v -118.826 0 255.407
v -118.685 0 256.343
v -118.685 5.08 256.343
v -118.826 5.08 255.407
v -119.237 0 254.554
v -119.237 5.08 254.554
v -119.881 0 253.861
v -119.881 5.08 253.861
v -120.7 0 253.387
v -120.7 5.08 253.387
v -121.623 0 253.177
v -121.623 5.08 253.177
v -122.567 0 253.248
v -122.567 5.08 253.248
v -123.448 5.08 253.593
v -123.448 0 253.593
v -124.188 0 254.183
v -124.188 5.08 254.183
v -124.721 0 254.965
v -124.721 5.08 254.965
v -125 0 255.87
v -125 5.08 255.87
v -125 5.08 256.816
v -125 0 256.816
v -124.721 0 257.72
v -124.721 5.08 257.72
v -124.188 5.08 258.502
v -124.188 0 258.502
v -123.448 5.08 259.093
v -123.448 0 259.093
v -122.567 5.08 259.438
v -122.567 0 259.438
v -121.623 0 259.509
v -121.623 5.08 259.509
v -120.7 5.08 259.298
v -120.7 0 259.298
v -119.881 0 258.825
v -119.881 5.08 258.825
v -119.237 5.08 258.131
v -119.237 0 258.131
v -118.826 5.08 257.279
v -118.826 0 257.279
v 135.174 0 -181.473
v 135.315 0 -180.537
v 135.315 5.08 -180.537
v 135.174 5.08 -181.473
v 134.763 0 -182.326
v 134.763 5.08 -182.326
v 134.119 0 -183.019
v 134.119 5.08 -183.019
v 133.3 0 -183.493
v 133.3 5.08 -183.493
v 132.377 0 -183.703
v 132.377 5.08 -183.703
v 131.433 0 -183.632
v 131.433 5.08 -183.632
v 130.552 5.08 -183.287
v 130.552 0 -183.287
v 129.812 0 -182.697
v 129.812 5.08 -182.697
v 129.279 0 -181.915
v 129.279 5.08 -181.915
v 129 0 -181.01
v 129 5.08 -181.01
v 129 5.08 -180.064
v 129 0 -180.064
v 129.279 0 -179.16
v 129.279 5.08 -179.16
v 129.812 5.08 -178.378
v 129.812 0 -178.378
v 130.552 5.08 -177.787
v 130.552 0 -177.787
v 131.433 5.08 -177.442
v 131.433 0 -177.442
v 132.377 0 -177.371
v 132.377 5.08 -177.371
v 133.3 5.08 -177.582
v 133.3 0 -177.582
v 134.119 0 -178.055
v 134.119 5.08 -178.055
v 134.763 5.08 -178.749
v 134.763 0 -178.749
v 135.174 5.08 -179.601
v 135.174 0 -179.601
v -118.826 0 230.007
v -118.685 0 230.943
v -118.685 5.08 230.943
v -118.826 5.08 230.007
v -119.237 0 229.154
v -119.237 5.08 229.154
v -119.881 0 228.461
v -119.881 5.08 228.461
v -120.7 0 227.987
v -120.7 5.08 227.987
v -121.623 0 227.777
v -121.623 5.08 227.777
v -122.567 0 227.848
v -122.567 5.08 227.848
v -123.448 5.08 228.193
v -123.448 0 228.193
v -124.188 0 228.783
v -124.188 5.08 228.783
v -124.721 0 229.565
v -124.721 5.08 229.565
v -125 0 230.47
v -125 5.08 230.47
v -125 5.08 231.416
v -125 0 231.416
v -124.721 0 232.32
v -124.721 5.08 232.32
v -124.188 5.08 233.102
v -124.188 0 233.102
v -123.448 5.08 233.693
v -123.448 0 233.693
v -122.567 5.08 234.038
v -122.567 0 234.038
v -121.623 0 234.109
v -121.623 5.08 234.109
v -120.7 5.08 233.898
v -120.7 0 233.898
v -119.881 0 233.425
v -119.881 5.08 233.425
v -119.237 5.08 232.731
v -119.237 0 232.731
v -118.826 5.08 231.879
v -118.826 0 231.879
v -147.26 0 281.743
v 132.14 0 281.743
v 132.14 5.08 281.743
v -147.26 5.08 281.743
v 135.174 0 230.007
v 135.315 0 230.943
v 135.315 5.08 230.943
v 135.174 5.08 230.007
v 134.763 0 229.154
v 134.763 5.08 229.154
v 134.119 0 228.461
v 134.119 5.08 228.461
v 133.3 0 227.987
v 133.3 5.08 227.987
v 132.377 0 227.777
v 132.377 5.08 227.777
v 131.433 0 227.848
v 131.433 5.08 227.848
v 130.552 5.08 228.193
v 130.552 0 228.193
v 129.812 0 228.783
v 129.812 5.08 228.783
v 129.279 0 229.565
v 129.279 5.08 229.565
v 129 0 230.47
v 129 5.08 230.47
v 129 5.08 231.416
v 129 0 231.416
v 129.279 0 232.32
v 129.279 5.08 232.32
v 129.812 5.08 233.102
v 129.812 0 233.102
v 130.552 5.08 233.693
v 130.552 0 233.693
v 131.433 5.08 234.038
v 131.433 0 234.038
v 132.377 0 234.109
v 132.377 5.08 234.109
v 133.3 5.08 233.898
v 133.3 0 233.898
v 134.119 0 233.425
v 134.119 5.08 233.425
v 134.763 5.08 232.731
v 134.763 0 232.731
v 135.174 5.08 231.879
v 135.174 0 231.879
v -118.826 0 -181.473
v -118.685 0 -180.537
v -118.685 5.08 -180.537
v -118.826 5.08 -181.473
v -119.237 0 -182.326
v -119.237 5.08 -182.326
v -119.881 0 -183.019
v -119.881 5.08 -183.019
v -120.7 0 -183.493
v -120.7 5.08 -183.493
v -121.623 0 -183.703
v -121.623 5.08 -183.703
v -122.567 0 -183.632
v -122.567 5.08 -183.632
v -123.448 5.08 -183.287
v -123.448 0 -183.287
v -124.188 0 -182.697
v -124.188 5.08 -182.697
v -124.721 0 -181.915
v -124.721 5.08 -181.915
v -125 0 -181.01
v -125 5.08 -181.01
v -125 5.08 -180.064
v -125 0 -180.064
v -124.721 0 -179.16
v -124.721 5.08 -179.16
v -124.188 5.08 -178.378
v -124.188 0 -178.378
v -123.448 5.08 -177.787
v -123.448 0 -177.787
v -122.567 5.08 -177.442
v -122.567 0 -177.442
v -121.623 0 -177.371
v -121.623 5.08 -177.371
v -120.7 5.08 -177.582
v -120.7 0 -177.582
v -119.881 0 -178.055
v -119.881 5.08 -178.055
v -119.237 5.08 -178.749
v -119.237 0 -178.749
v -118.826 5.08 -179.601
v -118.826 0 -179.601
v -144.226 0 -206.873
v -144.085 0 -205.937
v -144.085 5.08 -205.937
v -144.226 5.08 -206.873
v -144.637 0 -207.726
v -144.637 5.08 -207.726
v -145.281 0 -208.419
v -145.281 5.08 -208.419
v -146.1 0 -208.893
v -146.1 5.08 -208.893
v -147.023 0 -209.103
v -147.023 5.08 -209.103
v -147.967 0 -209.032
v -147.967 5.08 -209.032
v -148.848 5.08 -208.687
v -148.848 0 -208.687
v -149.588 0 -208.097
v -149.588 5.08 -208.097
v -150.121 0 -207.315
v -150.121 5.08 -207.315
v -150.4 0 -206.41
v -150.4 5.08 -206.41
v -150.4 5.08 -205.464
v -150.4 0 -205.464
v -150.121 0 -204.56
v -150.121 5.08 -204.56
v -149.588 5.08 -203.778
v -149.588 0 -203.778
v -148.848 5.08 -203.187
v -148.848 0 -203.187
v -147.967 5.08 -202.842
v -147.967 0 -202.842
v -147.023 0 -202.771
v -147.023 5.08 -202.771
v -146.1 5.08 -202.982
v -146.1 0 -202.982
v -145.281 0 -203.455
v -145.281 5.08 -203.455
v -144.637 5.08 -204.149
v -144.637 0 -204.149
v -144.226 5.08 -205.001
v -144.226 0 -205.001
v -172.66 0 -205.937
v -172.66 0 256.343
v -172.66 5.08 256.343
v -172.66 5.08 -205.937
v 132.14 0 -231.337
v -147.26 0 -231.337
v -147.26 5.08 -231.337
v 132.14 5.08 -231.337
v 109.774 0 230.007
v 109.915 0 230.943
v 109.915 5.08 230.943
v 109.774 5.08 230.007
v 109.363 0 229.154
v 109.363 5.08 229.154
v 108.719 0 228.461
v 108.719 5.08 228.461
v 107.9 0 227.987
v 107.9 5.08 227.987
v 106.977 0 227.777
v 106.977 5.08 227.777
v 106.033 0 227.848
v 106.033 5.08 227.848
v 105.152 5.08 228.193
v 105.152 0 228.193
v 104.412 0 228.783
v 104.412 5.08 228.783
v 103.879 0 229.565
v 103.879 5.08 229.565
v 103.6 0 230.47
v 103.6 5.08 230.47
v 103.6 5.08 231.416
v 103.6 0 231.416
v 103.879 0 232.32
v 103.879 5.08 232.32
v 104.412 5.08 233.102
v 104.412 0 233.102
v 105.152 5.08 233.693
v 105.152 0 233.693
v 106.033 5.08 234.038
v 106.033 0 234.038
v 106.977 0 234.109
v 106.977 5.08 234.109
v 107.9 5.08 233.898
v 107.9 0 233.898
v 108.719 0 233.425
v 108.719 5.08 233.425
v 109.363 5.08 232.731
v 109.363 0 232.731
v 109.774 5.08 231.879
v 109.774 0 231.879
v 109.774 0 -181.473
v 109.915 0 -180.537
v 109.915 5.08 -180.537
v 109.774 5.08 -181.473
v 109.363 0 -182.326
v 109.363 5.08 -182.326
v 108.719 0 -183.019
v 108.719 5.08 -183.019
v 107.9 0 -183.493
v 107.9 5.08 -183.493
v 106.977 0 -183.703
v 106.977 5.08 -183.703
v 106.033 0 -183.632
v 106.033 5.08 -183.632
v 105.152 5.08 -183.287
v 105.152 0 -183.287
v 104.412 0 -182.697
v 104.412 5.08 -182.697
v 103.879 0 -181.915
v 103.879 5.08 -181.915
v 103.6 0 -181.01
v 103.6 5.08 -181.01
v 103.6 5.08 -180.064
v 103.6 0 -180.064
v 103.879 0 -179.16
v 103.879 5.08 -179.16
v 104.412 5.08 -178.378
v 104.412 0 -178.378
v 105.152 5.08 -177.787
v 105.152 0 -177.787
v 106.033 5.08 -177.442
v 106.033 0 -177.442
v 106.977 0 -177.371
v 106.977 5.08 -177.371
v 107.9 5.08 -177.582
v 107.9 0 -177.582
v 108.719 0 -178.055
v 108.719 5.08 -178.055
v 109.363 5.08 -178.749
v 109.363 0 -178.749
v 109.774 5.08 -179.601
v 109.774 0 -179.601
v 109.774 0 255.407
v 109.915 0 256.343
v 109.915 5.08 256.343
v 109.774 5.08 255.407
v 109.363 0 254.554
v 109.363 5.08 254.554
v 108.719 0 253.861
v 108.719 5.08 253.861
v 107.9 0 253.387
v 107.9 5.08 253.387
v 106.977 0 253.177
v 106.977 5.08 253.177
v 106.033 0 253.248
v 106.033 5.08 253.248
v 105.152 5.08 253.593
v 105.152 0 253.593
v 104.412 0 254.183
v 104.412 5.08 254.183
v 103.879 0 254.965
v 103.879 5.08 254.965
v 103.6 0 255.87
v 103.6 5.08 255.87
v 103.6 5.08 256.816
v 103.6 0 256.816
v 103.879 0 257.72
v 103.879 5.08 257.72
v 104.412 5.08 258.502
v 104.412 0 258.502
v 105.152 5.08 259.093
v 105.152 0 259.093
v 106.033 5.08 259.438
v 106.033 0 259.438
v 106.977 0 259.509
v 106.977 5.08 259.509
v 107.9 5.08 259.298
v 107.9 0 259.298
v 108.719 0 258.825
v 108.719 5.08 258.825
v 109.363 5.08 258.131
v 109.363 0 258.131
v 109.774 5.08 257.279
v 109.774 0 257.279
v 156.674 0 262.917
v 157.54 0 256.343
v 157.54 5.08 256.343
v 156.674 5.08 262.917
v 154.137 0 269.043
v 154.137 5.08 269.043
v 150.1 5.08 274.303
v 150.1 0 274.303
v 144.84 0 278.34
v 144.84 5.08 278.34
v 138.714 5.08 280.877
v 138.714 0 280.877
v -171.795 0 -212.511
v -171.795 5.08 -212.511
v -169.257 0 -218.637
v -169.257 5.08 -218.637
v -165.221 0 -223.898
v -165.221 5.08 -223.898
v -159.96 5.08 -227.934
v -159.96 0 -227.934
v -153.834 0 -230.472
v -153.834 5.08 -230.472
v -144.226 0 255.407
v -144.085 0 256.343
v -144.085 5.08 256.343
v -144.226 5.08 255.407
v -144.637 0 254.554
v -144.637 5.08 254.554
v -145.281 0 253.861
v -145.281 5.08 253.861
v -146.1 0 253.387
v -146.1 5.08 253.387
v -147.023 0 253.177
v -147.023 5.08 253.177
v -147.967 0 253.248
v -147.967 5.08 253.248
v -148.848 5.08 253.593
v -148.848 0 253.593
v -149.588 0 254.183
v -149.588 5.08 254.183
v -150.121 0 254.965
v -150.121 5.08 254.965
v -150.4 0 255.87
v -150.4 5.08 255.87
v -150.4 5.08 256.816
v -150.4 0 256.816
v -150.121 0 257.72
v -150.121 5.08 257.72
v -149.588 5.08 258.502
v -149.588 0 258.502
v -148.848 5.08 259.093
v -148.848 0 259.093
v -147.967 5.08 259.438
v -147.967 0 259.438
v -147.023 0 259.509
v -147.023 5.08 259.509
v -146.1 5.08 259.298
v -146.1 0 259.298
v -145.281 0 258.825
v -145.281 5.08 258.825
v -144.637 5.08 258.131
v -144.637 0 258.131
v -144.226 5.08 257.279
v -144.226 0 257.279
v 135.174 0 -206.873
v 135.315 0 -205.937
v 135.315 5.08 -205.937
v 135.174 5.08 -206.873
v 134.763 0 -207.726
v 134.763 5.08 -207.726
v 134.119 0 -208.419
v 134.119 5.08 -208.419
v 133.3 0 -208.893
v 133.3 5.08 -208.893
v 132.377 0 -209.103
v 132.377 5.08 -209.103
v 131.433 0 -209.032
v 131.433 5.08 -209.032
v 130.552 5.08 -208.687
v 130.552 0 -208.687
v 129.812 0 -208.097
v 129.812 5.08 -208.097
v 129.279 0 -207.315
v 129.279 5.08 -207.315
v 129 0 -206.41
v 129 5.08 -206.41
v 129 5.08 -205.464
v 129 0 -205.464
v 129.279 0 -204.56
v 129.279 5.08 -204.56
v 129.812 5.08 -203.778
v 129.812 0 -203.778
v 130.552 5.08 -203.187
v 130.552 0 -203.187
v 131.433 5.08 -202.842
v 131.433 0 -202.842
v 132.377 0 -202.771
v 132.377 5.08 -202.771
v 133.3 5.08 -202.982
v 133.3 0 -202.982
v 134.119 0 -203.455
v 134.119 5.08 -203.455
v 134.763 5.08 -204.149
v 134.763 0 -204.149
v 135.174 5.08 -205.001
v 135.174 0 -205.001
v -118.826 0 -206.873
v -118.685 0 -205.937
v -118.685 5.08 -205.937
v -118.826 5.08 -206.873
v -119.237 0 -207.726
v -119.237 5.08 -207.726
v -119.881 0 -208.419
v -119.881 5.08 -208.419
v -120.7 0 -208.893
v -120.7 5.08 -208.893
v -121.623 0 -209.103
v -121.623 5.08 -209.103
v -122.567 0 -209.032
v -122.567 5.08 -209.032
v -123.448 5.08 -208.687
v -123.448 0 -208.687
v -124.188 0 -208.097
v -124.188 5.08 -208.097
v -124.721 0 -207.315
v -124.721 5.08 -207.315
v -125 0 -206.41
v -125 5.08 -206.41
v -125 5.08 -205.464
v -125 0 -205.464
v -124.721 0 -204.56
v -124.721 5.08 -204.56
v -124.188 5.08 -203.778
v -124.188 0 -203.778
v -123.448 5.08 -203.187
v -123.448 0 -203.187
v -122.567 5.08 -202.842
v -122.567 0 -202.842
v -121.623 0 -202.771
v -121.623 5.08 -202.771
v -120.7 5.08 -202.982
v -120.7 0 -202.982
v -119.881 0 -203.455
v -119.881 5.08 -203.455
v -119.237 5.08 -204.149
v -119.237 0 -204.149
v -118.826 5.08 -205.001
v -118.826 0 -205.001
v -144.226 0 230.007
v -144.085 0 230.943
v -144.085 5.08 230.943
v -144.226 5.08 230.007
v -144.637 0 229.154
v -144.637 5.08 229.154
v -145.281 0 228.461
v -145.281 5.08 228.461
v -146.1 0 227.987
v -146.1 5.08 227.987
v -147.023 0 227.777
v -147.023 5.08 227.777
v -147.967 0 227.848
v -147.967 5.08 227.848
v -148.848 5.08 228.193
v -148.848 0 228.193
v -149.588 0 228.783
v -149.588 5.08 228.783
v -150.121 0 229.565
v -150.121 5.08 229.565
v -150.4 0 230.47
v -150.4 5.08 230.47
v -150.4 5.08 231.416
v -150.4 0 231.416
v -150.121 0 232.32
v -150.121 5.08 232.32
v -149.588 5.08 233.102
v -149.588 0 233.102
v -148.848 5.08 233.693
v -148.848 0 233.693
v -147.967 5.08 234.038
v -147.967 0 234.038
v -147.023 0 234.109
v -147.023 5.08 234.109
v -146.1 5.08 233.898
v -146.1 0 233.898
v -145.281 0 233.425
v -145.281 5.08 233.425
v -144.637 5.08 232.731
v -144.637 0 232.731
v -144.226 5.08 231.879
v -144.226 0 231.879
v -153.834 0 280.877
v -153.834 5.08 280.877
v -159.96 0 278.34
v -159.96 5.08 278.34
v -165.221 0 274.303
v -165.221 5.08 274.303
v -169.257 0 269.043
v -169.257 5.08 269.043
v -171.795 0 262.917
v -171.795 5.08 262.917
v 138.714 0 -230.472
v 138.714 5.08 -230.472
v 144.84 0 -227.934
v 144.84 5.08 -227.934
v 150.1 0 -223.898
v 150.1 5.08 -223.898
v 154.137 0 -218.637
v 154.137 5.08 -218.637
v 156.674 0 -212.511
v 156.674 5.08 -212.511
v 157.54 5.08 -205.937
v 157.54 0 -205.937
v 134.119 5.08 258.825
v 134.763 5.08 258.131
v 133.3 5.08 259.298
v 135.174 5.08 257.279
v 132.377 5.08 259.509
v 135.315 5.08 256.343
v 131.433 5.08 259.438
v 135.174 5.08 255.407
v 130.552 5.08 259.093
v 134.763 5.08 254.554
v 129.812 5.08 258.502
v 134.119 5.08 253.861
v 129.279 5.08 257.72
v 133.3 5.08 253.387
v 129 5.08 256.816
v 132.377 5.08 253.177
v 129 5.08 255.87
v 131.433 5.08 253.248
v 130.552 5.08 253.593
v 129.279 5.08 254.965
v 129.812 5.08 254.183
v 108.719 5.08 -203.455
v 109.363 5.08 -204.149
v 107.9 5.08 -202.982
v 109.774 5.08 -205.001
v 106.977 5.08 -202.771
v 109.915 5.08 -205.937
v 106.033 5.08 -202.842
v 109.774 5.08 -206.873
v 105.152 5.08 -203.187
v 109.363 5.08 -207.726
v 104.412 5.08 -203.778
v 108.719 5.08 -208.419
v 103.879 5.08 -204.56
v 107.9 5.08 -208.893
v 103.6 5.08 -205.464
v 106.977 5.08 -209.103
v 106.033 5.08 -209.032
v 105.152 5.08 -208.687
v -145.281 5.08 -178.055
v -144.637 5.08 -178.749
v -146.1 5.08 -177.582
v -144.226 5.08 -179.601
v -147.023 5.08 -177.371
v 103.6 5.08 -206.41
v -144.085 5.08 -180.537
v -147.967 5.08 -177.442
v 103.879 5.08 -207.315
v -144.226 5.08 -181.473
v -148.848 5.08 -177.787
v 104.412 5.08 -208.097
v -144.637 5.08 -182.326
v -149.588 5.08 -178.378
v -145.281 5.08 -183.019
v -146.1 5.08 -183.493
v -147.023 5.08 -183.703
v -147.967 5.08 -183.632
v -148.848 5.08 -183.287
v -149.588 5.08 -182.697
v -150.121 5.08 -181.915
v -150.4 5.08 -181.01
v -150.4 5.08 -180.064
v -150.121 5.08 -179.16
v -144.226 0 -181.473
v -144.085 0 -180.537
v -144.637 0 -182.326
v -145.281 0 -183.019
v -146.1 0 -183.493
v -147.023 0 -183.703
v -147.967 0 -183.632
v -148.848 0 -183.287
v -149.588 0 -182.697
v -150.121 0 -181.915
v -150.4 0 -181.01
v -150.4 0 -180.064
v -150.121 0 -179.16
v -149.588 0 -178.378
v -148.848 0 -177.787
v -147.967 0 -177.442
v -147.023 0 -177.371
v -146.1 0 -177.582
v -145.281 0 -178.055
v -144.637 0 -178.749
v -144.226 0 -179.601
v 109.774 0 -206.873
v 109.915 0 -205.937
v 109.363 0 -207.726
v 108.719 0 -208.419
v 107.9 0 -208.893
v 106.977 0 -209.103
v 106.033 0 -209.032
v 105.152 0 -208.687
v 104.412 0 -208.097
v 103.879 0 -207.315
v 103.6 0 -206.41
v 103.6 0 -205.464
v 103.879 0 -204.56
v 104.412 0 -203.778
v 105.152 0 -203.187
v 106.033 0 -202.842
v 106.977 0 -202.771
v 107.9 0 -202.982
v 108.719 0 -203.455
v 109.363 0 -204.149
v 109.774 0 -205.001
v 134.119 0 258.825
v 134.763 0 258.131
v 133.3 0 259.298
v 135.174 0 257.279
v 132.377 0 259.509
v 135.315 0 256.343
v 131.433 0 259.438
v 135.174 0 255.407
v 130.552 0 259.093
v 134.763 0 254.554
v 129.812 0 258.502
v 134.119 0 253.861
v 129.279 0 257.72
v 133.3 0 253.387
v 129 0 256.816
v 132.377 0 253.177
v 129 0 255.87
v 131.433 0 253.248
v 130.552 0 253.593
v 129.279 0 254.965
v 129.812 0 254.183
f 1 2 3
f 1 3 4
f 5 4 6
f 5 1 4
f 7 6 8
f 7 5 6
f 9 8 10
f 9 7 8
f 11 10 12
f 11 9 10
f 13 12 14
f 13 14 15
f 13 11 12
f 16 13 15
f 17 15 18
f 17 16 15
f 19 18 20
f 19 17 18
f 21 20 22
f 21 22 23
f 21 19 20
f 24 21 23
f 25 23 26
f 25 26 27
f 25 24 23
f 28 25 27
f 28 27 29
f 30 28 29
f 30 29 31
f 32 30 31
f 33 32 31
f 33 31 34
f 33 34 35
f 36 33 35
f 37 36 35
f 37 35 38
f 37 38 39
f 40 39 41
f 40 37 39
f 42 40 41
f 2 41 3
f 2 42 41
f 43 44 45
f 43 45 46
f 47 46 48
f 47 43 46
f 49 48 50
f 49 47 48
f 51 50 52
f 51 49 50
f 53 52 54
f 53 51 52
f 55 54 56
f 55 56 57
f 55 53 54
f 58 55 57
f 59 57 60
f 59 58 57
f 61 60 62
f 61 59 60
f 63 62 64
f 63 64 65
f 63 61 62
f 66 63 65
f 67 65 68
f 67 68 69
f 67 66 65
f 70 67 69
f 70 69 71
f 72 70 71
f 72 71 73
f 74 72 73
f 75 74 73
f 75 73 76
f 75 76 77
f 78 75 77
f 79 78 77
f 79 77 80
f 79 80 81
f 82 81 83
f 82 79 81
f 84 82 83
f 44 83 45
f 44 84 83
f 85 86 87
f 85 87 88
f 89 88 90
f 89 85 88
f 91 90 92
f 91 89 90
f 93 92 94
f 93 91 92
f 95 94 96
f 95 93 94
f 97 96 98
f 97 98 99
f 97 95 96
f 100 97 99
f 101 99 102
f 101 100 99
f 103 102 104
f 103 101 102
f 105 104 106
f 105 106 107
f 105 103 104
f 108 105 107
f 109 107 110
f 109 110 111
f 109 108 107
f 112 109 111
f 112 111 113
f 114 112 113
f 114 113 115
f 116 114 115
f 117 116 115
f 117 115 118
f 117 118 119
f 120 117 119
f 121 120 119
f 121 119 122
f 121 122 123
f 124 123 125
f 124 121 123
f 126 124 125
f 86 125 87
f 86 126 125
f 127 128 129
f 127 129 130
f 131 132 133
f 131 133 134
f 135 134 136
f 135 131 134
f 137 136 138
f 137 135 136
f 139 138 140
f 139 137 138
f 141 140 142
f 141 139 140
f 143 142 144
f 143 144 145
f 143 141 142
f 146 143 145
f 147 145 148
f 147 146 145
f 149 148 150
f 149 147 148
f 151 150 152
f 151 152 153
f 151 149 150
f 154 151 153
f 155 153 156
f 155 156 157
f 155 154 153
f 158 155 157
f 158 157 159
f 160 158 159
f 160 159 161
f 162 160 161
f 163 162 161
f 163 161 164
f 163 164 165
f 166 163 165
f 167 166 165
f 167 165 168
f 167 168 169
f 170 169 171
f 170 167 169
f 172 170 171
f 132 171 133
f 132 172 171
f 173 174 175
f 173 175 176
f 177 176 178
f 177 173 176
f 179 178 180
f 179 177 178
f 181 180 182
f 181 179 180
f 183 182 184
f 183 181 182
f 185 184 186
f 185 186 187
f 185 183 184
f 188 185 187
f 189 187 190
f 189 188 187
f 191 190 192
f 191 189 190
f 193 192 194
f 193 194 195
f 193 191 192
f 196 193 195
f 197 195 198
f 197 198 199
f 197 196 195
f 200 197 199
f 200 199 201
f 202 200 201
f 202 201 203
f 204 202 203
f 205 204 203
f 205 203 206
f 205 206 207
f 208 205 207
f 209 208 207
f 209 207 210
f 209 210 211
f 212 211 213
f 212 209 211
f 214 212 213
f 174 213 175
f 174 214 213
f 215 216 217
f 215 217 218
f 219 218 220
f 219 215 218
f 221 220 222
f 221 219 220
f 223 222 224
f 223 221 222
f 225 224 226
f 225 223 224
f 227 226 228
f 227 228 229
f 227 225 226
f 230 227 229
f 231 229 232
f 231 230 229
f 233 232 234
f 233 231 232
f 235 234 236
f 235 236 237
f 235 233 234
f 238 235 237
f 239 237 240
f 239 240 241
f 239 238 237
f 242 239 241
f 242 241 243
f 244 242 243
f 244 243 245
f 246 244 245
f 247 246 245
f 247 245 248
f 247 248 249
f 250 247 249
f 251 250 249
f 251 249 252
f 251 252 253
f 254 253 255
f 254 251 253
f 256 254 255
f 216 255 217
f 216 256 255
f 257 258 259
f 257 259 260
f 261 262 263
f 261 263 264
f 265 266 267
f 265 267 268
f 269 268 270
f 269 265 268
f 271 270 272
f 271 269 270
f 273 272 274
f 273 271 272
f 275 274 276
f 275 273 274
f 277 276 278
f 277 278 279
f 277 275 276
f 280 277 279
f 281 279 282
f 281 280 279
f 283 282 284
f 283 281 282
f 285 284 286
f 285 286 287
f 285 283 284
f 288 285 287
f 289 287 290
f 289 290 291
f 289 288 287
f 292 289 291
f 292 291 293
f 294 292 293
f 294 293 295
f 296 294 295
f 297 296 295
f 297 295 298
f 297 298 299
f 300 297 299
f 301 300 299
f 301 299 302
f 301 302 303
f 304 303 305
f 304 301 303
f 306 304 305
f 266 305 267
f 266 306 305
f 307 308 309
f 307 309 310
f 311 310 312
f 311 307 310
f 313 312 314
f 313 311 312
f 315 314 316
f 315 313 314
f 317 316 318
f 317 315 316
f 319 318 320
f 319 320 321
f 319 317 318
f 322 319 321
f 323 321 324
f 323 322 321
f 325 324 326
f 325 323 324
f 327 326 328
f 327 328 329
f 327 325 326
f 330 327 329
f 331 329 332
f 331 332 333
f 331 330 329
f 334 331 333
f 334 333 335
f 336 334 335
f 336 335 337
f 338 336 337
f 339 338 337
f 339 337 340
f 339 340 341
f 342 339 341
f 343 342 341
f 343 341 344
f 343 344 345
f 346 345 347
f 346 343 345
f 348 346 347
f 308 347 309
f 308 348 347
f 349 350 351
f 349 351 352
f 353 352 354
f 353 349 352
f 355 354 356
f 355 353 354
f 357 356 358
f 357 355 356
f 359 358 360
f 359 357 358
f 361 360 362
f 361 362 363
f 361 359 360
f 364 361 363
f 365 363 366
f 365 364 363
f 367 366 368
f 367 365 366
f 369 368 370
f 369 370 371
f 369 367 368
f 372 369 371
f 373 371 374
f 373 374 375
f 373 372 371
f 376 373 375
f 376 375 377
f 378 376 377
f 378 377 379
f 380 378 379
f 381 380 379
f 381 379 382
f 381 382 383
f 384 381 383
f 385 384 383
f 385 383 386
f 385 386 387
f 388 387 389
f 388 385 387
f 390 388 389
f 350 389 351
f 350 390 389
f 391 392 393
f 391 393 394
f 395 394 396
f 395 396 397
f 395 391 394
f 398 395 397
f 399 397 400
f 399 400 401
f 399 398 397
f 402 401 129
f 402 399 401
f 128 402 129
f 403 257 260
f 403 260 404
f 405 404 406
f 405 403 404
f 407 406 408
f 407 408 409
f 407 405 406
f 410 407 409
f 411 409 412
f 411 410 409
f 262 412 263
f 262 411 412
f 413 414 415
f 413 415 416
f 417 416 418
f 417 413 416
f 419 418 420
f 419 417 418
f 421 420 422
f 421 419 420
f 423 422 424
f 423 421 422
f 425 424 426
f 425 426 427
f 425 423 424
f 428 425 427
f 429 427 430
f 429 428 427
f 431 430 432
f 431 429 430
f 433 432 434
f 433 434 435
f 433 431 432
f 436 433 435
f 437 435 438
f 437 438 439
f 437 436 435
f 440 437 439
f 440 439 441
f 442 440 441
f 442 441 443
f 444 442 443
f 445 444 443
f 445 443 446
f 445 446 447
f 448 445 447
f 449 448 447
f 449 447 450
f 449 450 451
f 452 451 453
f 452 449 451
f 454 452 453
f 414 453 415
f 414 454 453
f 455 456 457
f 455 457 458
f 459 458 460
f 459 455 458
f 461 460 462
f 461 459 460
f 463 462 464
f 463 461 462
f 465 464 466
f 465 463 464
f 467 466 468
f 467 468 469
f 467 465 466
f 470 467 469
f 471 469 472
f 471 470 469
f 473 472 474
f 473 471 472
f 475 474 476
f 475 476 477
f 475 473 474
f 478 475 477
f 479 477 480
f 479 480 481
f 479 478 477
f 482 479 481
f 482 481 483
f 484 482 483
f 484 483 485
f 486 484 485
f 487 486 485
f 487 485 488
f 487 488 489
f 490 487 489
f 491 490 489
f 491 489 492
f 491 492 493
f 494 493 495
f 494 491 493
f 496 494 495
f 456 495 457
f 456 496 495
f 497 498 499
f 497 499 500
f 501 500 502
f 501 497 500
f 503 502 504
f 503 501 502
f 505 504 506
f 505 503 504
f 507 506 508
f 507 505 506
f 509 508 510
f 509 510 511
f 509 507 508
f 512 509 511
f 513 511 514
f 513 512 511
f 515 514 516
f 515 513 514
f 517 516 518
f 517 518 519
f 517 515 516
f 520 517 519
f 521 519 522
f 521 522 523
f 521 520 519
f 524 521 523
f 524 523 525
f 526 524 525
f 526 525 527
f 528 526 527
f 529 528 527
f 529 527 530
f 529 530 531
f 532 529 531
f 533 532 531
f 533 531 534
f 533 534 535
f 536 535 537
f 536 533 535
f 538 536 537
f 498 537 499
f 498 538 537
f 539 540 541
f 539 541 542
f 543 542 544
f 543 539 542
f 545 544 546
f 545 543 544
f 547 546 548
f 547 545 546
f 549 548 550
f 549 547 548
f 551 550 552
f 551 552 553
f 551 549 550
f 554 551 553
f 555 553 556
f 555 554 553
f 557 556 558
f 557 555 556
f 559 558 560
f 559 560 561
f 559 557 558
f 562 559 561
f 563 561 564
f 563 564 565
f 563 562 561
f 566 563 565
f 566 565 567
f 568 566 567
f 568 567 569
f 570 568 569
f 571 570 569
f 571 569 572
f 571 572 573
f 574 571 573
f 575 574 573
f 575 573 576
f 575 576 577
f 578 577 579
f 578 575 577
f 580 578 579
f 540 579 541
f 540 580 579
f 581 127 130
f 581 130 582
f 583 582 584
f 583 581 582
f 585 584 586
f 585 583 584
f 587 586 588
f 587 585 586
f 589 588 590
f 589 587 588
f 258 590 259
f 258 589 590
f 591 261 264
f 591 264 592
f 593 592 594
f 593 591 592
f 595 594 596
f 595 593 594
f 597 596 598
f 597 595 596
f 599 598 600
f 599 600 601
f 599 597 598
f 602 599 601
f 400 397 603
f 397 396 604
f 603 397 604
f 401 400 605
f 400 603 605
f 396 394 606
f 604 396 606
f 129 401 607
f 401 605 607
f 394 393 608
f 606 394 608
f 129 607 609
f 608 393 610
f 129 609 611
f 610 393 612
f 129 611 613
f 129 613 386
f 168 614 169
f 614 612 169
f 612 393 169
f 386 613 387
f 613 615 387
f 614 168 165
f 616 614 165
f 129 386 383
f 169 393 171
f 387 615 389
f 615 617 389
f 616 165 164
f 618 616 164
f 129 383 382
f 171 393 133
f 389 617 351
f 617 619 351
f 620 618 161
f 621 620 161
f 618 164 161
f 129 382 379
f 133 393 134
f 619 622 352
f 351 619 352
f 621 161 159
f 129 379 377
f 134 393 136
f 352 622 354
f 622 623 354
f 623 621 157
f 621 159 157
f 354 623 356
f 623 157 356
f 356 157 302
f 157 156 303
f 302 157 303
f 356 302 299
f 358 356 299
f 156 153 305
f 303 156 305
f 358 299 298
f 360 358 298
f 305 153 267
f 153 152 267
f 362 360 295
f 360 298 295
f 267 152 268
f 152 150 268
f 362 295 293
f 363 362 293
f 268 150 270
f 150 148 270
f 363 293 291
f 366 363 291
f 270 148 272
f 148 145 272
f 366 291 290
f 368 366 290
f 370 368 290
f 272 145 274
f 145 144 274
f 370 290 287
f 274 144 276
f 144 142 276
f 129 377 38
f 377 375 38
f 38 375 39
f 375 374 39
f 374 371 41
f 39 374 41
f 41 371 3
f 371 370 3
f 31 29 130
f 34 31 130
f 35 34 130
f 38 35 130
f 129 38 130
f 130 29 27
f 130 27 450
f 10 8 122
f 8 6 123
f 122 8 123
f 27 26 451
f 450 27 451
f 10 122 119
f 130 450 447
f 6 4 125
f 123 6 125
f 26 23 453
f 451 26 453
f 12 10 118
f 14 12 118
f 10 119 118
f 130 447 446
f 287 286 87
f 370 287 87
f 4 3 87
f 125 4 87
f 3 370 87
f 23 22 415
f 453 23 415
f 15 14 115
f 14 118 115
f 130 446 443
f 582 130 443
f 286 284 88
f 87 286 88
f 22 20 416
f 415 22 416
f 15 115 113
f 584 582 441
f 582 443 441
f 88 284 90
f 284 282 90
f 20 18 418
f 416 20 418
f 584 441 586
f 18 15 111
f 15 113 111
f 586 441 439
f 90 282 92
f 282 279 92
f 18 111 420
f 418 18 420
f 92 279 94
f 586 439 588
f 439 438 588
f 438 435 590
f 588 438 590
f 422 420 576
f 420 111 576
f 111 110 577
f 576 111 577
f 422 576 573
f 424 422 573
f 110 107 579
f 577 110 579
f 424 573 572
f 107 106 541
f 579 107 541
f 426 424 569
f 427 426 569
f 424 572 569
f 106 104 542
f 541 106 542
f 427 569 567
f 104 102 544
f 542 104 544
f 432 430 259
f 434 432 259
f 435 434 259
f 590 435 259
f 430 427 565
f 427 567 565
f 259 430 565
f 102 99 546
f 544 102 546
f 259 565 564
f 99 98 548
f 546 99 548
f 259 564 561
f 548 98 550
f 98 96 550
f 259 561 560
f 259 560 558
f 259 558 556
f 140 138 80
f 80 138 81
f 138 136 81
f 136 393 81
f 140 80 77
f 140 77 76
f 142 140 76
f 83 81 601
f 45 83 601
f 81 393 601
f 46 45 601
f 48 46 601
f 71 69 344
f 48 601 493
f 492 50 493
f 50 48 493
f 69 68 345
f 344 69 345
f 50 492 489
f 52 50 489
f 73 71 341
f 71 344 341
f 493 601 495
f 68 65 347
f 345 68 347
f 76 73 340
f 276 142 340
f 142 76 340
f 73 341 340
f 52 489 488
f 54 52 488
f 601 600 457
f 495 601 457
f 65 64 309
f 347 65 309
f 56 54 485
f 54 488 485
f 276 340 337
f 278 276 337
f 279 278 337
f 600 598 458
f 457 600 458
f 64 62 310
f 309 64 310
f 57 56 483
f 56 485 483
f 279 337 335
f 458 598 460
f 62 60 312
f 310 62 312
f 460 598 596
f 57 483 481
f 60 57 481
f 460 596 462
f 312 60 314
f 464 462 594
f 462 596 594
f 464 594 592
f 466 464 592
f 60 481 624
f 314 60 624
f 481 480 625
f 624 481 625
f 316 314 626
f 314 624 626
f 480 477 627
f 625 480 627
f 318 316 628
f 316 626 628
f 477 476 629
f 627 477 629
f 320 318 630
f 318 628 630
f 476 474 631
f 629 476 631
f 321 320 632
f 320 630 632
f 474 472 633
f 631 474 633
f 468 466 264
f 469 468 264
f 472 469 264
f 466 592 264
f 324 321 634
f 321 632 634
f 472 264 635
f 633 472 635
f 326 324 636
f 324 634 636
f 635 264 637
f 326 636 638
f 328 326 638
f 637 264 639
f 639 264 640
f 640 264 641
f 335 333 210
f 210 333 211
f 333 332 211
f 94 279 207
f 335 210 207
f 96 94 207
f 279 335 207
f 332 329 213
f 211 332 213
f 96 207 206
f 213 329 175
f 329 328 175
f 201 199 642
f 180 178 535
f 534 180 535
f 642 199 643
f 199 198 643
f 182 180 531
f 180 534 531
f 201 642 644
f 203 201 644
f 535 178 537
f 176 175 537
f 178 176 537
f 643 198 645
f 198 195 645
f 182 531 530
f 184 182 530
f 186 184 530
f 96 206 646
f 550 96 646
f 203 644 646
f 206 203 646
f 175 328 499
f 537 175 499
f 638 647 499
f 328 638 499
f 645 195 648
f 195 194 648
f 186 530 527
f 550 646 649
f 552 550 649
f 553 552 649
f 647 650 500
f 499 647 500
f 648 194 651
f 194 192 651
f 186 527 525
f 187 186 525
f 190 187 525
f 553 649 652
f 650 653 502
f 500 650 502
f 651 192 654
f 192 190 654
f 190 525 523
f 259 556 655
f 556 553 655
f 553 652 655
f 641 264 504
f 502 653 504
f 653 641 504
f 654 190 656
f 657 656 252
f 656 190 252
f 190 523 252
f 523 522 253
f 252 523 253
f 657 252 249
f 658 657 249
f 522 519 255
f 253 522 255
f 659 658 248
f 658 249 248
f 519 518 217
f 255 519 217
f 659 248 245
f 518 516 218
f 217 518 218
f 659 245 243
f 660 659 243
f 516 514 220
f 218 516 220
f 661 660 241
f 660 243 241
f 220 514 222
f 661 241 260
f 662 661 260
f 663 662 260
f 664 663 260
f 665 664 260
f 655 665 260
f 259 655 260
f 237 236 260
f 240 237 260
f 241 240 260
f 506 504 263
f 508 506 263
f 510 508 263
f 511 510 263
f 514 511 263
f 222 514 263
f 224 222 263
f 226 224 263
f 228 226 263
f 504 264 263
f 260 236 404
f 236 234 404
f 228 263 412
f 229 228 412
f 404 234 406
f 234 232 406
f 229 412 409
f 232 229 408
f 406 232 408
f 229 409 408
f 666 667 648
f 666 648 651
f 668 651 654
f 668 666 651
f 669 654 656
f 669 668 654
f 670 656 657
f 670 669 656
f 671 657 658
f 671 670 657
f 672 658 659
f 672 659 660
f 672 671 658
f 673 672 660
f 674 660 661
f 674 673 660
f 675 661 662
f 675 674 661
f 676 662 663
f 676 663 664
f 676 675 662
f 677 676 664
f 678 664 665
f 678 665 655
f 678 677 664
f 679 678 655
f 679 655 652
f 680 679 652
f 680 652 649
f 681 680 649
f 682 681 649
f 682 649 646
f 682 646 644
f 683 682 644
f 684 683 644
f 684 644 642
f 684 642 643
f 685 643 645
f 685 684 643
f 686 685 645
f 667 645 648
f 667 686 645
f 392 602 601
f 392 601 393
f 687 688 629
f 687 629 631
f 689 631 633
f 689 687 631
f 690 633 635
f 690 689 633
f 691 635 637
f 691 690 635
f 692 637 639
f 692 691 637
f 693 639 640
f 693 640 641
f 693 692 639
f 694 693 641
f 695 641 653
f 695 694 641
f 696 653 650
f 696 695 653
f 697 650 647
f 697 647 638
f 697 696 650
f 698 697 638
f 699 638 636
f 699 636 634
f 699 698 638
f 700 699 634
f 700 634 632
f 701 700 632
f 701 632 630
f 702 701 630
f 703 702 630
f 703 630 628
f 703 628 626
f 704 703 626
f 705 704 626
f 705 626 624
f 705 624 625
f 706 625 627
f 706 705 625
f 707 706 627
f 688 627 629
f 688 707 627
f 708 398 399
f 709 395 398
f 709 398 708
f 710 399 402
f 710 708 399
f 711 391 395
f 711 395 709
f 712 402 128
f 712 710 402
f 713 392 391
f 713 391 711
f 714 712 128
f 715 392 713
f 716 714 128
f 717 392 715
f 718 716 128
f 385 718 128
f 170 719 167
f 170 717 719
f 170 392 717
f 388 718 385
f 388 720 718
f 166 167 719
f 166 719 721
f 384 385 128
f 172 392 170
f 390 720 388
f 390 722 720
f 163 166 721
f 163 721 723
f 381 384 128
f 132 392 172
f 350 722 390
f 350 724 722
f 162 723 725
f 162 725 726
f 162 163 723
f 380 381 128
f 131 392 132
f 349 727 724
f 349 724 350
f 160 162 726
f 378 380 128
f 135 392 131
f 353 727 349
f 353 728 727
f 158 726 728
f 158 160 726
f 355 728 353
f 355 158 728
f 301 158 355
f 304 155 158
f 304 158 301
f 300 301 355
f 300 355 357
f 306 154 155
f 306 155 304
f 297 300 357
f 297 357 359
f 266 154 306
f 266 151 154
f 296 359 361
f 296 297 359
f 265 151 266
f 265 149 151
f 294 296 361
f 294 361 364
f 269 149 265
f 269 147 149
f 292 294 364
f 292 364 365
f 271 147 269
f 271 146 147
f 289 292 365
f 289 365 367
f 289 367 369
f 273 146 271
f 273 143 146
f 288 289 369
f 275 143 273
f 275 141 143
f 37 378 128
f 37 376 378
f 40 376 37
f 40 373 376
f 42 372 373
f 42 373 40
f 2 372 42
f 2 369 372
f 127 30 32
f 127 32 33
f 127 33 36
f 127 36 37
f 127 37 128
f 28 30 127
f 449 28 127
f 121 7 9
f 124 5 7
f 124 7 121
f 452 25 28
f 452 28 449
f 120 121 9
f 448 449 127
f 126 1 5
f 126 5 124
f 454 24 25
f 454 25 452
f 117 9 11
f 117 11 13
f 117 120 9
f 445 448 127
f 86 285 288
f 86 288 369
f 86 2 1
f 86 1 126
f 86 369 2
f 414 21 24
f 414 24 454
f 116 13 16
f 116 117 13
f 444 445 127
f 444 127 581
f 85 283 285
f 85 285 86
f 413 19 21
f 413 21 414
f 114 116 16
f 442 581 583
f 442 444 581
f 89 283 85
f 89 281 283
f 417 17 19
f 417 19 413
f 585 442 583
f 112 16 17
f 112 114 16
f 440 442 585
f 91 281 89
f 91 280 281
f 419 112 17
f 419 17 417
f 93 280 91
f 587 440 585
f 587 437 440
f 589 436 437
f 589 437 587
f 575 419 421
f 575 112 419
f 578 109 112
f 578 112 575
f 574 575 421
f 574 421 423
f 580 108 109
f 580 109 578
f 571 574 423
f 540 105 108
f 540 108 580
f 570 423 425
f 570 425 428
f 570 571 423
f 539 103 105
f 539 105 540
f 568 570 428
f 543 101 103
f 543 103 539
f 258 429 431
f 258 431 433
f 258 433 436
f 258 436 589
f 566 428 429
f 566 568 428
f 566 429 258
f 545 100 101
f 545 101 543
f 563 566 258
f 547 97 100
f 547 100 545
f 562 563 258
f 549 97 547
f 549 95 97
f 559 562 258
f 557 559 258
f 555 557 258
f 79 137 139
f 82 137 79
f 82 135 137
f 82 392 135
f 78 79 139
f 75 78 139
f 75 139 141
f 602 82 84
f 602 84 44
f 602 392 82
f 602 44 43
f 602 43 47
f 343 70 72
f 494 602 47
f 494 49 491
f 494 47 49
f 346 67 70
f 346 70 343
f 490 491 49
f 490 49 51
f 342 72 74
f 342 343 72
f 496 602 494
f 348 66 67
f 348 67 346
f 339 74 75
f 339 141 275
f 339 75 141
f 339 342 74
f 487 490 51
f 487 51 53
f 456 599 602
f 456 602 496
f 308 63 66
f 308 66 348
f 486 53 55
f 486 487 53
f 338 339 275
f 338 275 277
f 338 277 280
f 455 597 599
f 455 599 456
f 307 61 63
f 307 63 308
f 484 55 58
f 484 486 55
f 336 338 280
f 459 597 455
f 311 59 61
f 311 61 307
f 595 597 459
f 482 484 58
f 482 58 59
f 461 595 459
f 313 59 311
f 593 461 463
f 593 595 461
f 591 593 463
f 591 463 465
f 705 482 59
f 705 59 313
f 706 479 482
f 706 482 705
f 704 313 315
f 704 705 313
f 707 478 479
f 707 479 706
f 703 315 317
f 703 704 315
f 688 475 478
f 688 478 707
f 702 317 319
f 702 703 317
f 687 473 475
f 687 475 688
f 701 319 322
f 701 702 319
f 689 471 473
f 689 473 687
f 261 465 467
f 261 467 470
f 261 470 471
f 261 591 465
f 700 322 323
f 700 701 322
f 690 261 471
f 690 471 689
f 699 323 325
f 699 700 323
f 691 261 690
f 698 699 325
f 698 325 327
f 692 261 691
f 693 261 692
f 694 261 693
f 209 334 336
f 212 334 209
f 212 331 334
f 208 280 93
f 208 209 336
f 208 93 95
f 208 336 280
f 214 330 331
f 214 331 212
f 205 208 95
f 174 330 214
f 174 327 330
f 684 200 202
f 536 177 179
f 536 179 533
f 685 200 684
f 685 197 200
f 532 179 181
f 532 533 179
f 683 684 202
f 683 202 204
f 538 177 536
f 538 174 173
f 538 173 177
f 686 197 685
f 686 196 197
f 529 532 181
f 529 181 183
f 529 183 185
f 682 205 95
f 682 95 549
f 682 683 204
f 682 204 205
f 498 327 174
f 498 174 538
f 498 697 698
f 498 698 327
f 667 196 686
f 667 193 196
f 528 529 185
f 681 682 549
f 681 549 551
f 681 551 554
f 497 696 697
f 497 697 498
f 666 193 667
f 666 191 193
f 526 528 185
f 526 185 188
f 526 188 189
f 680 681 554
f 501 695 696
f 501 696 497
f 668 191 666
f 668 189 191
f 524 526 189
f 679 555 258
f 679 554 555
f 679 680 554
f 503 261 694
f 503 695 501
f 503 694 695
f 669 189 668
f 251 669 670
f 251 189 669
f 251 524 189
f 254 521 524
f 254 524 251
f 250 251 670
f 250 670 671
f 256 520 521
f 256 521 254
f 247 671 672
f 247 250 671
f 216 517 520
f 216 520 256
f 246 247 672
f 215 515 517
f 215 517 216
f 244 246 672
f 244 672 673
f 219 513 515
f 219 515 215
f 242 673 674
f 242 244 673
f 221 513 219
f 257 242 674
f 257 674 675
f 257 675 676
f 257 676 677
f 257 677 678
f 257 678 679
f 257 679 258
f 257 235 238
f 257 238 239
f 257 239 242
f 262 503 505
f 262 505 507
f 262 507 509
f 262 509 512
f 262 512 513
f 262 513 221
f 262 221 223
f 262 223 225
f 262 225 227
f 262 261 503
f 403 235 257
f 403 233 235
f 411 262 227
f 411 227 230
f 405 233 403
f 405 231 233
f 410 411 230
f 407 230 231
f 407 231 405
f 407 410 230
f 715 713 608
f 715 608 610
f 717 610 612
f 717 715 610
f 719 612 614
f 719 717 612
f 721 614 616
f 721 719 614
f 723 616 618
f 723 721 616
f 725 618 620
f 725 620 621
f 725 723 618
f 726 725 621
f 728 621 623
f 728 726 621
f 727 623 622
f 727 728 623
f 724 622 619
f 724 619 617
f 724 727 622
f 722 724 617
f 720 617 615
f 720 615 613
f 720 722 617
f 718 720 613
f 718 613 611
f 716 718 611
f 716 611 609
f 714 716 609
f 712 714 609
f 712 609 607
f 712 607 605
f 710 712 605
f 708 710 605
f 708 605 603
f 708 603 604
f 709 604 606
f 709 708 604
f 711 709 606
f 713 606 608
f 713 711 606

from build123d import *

# Parameters (mm, degrees)
SKETCH1_R           = 3.175
BOSS_EXTRUDE1_DEPTH = 5.08


with BuildPart() as part:
    # Sketch1 → Boss-Extrude1 (new body)
    with BuildSketch(Plane(origin=(0, 0, 0), x_dir=(1, 0, 0), z_dir=(0, 1, 0))):
        with BuildLine():
            Line((-147.260105464, 231.337081644), (132.139894536, 231.337081644))
            ThreePointArc((132.139894536, 231.337081644), (150.100406779, 223.897593887), (157.539894536, 205.937081644))
            Line((157.539894536, 205.937081644), (157.539894536, -256.342918356))
            ThreePointArc((157.539894536, -256.342918356), (150.100406779, -274.303430598), (132.139894536, -281.742918356))
            Line((132.139894536, -281.742918356), (-147.260105464, -281.742918356))
            ThreePointArc((-147.260105464, -281.742918356), (-165.220617706, -274.303430598), (-172.660105464, -256.342918356))
            Line((-172.660105464, -256.342918356), (-172.660105464, 205.937081644))
            ThreePointArc((-172.660105464, 205.937081644), (-165.220617706, 223.897593887), (-147.260105464, 231.337081644))
        make_face()
        with Locations((-147.260105464, 205.937081644)):
            Circle(SKETCH1_R, mode=Mode.SUBTRACT)
        with Locations((-121.860105464, 205.937081644)):
            Circle(SKETCH1_R, mode=Mode.SUBTRACT)
        with Locations((-121.860105464, 180.537081644)):
            Circle(SKETCH1_R, mode=Mode.SUBTRACT)
        with Locations((-147.260105464, 180.537081644)):
            Circle(SKETCH1_R, mode=Mode.SUBTRACT)
        with Locations((132.139894536, 180.537081644)):
            Circle(SKETCH1_R, mode=Mode.SUBTRACT)
        with Locations((106.739894536, 180.537081644)):
            Circle(SKETCH1_R, mode=Mode.SUBTRACT)
        with Locations((106.739894536, 205.937081644)):
            Circle(SKETCH1_R, mode=Mode.SUBTRACT)
        with Locations((132.139894536, 205.937081644)):
            Circle(SKETCH1_R, mode=Mode.SUBTRACT)
        with Locations((132.139894536, -256.342918356)):
            Circle(SKETCH1_R, mode=Mode.SUBTRACT)
        with Locations((106.739894536, -256.342918356)):
            Circle(SKETCH1_R, mode=Mode.SUBTRACT)
        with Locations((106.739894536, -230.942918356)):
            Circle(SKETCH1_R, mode=Mode.SUBTRACT)
        with Locations((132.139894536, -230.942918356)):
            Circle(SKETCH1_R, mode=Mode.SUBTRACT)
        with Locations((-121.860105464, -256.342918356)):
            Circle(SKETCH1_R, mode=Mode.SUBTRACT)
        with Locations((-147.260105464, -256.342918356)):
            Circle(SKETCH1_R, mode=Mode.SUBTRACT)
        with Locations((-147.260105464, -230.942918356)):
            Circle(SKETCH1_R, mode=Mode.SUBTRACT)
        with Locations((-121.860105464, -230.942918356)):
            Circle(SKETCH1_R, mode=Mode.SUBTRACT)
    extrude(amount=BOSS_EXTRUDE1_DEPTH)


solid = part.part
